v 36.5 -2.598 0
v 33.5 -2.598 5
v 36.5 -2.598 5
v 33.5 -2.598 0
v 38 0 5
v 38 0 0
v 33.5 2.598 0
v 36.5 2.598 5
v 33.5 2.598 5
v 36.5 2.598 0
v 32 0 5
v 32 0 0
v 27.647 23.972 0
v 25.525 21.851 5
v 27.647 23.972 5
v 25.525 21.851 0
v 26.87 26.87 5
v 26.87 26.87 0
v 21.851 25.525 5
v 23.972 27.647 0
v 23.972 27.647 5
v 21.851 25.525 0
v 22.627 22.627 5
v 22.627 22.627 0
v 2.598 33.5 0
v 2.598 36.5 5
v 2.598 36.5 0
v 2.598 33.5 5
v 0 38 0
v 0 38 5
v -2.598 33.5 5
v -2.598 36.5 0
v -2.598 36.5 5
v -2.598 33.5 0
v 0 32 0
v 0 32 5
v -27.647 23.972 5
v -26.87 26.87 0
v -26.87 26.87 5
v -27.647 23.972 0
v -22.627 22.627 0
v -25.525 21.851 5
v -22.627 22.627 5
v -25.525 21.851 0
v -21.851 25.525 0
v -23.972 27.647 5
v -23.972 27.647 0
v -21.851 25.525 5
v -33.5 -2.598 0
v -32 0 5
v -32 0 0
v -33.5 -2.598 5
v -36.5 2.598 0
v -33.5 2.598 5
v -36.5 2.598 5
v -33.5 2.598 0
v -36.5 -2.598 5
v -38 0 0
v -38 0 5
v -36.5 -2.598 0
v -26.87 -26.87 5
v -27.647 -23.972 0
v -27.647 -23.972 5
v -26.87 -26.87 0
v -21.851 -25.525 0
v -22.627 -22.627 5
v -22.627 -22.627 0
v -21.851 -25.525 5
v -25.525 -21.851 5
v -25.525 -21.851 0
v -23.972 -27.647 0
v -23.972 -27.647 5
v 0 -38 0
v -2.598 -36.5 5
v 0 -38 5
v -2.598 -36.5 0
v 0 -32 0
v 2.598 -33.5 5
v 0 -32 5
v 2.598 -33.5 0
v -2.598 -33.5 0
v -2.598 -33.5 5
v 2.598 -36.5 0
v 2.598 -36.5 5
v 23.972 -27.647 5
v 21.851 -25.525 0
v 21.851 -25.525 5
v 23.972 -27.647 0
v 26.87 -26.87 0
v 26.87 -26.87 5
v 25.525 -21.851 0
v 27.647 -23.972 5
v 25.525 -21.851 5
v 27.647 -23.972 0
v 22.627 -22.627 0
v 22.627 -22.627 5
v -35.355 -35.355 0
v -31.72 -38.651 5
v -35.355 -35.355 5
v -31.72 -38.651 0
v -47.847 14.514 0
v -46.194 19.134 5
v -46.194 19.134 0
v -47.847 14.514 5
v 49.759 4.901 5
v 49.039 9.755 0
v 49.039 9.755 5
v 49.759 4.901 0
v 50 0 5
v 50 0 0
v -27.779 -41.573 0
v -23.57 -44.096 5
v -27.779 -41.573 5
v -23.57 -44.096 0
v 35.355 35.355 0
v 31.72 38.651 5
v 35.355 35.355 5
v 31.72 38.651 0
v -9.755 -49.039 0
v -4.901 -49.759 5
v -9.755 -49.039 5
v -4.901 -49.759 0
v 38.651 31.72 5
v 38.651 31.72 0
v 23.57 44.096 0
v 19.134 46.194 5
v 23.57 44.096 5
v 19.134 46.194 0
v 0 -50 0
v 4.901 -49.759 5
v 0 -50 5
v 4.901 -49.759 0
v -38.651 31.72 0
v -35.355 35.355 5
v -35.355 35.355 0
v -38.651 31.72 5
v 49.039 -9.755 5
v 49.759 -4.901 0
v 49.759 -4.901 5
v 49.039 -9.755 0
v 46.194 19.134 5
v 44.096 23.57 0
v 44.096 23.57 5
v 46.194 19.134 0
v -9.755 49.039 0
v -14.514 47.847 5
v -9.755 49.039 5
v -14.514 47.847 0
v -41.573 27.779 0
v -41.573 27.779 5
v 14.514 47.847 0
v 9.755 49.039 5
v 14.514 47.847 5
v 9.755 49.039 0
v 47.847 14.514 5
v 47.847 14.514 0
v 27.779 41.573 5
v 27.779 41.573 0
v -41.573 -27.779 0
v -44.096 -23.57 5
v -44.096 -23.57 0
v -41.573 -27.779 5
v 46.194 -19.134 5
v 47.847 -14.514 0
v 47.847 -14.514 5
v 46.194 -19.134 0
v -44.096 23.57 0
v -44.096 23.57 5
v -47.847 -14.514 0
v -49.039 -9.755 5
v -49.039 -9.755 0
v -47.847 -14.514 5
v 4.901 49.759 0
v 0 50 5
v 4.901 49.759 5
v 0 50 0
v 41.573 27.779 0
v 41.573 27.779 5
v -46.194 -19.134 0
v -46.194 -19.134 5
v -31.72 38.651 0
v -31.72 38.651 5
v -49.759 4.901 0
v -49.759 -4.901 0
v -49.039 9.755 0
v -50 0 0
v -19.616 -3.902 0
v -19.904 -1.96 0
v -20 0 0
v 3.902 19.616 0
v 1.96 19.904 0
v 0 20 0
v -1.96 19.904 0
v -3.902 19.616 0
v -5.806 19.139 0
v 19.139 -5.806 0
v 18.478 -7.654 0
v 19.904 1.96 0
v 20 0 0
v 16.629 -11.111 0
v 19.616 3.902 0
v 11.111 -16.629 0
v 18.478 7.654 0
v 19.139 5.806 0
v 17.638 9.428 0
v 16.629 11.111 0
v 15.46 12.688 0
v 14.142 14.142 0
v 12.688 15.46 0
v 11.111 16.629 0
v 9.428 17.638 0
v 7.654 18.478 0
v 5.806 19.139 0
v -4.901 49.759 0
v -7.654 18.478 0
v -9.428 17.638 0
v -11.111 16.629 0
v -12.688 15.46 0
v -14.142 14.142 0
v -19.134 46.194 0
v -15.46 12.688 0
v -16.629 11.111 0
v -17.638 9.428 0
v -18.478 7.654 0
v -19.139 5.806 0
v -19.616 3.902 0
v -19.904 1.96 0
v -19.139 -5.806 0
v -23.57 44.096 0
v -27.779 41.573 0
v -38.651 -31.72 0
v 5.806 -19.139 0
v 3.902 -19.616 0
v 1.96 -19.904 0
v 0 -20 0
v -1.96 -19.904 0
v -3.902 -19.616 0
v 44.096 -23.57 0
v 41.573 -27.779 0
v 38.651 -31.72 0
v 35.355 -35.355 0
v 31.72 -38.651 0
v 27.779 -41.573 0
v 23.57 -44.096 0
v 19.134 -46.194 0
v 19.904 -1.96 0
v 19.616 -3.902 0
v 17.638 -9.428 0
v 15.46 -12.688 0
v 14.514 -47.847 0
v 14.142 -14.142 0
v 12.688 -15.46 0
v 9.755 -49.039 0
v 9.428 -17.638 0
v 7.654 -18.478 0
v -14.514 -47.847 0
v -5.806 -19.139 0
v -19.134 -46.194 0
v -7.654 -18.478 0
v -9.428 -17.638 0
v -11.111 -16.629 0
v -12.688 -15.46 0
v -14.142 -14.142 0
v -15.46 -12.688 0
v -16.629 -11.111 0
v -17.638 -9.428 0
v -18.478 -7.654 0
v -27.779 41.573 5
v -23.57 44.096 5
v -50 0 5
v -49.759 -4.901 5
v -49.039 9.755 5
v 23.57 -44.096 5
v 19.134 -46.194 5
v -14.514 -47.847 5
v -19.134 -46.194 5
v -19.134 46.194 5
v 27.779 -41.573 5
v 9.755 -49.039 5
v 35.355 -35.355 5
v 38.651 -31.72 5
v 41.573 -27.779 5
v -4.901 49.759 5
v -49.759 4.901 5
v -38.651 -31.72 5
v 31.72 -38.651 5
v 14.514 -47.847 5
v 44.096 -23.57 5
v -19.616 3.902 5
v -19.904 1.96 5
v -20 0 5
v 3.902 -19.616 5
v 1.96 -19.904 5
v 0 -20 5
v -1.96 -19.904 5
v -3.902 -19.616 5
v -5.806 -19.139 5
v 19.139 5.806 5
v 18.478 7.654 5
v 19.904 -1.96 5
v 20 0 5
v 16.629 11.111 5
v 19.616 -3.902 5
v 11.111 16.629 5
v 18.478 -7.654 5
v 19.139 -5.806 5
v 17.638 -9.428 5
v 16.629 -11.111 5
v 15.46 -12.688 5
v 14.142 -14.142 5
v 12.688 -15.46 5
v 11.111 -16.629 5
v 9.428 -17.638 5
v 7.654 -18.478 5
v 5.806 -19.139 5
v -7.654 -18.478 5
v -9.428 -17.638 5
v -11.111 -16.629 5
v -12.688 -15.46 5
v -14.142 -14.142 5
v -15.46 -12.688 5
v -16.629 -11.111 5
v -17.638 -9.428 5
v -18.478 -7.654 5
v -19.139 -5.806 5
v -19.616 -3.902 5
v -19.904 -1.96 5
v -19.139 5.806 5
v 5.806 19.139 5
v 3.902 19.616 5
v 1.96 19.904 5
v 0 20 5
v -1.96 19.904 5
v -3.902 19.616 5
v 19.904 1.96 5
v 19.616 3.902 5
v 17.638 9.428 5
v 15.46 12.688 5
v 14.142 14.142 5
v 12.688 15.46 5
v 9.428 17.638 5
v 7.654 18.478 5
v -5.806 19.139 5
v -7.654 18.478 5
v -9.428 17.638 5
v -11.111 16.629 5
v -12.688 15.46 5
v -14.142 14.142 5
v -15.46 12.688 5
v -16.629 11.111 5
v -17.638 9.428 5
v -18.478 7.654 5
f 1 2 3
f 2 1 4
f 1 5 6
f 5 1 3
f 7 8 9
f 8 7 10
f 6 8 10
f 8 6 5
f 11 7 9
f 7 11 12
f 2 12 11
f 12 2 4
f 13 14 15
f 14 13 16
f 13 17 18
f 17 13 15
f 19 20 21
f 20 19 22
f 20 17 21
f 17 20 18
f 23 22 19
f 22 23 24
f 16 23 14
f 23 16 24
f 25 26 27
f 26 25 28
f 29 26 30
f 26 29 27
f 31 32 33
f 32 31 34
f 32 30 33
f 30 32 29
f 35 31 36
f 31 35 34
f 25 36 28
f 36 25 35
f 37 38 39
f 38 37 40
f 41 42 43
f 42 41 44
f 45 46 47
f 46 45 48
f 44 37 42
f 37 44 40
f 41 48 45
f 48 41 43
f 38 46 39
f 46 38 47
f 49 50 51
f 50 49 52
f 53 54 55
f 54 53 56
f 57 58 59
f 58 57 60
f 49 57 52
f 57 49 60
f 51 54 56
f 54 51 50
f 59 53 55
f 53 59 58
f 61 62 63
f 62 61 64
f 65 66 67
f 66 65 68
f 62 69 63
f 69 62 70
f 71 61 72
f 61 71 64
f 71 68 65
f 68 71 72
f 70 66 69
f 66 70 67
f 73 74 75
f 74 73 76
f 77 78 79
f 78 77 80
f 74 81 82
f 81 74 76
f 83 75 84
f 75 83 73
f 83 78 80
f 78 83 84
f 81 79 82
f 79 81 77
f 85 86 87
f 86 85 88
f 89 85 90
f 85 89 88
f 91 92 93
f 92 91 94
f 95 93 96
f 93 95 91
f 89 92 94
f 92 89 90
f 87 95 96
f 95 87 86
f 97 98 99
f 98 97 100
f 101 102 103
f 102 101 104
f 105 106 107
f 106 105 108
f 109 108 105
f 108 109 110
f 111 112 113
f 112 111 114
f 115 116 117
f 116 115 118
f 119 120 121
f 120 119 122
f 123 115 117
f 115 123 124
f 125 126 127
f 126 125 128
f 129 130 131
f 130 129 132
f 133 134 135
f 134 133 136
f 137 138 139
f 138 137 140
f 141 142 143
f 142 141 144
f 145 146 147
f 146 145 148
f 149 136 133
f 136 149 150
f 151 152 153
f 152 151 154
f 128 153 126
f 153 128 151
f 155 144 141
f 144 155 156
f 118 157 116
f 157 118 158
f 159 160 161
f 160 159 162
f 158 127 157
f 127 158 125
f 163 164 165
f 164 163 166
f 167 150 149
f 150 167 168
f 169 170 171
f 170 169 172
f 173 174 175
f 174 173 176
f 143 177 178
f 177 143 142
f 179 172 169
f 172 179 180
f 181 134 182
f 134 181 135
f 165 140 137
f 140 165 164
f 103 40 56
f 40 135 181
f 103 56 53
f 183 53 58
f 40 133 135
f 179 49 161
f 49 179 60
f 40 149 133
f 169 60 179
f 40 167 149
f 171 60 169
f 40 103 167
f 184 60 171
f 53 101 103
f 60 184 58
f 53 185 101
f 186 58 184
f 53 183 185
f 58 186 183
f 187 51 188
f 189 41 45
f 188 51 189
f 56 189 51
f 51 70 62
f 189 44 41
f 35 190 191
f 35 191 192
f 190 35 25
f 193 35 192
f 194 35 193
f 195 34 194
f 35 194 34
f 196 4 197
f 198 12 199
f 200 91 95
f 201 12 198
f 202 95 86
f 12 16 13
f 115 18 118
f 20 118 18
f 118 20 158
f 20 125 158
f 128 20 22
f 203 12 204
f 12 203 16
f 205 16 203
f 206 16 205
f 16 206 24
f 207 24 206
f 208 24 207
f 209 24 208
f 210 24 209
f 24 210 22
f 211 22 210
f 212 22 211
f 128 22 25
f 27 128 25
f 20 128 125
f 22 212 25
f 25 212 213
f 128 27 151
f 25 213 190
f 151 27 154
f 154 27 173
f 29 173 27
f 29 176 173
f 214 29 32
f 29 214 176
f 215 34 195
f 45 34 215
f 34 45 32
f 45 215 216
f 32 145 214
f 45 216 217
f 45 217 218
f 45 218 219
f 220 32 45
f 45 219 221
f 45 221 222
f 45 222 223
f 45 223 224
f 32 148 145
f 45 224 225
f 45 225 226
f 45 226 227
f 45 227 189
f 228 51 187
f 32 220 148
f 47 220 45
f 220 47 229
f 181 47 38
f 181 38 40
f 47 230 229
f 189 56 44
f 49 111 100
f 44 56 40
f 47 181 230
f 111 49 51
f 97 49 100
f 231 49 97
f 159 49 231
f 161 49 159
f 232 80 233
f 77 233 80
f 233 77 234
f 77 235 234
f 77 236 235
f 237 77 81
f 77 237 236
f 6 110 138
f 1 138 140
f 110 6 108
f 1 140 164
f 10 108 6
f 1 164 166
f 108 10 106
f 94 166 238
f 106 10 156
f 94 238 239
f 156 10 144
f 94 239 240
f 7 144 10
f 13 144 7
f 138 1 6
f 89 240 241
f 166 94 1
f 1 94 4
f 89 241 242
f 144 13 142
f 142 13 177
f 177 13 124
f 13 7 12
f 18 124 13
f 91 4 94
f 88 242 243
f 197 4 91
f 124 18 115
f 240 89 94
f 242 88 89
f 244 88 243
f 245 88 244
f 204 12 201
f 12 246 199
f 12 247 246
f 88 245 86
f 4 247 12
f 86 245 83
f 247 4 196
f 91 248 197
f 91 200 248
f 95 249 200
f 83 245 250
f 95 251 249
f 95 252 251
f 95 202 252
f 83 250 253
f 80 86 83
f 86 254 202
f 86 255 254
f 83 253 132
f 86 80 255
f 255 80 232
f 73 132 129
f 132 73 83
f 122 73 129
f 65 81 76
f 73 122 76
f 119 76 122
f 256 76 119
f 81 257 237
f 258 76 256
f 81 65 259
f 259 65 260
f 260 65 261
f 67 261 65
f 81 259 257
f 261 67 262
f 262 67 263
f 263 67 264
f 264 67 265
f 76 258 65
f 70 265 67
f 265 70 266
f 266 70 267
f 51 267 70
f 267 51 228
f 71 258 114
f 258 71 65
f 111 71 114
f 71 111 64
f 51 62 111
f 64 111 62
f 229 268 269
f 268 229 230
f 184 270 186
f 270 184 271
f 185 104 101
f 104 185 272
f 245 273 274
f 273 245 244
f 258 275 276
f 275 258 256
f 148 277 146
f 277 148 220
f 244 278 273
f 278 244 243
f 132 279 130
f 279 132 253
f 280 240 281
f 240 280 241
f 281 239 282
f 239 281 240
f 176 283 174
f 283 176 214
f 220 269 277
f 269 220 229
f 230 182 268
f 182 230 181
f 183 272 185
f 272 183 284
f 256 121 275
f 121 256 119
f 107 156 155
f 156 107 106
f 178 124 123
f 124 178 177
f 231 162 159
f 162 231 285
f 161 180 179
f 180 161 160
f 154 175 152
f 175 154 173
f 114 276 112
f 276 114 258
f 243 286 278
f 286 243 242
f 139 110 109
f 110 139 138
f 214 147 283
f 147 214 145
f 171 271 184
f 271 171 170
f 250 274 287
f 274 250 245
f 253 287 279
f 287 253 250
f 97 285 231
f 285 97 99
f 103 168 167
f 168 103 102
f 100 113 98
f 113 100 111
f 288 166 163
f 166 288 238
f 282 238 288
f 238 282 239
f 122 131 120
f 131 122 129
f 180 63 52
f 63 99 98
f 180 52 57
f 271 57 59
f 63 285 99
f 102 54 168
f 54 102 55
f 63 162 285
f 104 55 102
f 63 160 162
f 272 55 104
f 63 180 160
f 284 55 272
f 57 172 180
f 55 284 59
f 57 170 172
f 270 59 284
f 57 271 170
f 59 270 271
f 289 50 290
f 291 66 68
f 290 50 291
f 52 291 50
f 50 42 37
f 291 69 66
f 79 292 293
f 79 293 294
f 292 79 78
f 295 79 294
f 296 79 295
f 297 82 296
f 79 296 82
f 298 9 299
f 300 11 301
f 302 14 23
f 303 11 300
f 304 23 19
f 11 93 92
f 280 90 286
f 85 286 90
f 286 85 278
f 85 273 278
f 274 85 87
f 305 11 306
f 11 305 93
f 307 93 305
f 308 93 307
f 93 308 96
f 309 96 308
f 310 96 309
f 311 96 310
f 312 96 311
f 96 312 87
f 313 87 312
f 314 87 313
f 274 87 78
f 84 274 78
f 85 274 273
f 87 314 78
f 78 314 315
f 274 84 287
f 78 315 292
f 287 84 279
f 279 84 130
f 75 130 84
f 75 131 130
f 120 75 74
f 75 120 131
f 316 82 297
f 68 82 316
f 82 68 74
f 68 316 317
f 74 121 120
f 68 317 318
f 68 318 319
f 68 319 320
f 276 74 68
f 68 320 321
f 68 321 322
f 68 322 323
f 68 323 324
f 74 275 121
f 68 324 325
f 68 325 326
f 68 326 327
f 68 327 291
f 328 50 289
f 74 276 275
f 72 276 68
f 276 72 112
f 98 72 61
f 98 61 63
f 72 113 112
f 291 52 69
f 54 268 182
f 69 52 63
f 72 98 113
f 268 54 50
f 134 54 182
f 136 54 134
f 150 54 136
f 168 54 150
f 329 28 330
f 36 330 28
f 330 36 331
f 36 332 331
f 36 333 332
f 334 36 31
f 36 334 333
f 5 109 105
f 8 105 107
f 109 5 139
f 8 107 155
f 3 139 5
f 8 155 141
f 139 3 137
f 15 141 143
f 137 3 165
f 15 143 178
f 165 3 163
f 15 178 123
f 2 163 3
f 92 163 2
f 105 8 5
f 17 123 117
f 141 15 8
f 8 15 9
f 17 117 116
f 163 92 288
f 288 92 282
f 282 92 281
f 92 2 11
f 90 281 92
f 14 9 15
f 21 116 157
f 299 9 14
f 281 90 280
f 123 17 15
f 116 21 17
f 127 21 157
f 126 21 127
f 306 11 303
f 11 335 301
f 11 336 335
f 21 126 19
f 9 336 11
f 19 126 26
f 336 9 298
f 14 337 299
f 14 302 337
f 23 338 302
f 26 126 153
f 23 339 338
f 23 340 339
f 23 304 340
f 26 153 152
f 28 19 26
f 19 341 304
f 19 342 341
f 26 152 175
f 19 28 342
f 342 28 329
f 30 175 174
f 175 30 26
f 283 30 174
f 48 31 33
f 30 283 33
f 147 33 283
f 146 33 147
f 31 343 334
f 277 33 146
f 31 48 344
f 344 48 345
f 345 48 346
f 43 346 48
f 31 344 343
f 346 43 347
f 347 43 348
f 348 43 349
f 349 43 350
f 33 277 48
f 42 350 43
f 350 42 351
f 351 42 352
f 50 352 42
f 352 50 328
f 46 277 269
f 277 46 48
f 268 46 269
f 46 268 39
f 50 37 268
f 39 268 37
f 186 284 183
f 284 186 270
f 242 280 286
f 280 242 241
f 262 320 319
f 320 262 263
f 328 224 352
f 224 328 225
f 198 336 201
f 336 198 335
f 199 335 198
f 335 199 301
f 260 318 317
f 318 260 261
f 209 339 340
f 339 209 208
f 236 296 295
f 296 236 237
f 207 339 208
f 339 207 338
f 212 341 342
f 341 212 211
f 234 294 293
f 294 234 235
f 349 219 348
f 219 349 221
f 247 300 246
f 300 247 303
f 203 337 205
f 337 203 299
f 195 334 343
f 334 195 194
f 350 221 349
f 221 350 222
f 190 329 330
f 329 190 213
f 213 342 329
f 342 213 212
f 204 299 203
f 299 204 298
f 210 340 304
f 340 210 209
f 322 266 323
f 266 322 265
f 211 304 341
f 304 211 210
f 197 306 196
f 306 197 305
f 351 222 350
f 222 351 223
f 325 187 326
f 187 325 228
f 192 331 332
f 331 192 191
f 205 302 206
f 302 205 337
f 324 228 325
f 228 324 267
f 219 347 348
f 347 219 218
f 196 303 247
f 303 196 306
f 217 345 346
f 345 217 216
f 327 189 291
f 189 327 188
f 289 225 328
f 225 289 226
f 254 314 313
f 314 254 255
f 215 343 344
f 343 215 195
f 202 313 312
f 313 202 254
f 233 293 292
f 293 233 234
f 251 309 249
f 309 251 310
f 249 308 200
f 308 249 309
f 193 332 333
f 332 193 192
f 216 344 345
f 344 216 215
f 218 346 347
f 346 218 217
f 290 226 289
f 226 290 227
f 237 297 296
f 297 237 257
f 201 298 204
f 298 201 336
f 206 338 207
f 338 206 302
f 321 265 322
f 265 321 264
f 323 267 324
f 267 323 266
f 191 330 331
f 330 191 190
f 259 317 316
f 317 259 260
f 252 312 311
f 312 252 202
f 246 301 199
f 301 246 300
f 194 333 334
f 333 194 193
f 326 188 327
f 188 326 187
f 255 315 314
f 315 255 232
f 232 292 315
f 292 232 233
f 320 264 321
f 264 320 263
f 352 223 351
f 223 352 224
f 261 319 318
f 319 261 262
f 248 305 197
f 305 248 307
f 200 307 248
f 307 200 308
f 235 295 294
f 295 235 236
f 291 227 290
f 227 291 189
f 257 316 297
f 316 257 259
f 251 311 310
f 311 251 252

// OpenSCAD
module flange() {
    difference() {
        // Main disk
        cylinder(h=5, r=50, $fn=64);
        
        // Central large hole
        translate([0, 0, -1])
            cylinder(h=7, r=20, $fn=64);
        
        // Small hexagonal holes
        for (i = [0:7]) {
            rotate([0, 0, i * 45])
                translate([35, 0, -1])
                    cylinder(h=7, r=3, $fn=6);
        }
    }
}

flange();
